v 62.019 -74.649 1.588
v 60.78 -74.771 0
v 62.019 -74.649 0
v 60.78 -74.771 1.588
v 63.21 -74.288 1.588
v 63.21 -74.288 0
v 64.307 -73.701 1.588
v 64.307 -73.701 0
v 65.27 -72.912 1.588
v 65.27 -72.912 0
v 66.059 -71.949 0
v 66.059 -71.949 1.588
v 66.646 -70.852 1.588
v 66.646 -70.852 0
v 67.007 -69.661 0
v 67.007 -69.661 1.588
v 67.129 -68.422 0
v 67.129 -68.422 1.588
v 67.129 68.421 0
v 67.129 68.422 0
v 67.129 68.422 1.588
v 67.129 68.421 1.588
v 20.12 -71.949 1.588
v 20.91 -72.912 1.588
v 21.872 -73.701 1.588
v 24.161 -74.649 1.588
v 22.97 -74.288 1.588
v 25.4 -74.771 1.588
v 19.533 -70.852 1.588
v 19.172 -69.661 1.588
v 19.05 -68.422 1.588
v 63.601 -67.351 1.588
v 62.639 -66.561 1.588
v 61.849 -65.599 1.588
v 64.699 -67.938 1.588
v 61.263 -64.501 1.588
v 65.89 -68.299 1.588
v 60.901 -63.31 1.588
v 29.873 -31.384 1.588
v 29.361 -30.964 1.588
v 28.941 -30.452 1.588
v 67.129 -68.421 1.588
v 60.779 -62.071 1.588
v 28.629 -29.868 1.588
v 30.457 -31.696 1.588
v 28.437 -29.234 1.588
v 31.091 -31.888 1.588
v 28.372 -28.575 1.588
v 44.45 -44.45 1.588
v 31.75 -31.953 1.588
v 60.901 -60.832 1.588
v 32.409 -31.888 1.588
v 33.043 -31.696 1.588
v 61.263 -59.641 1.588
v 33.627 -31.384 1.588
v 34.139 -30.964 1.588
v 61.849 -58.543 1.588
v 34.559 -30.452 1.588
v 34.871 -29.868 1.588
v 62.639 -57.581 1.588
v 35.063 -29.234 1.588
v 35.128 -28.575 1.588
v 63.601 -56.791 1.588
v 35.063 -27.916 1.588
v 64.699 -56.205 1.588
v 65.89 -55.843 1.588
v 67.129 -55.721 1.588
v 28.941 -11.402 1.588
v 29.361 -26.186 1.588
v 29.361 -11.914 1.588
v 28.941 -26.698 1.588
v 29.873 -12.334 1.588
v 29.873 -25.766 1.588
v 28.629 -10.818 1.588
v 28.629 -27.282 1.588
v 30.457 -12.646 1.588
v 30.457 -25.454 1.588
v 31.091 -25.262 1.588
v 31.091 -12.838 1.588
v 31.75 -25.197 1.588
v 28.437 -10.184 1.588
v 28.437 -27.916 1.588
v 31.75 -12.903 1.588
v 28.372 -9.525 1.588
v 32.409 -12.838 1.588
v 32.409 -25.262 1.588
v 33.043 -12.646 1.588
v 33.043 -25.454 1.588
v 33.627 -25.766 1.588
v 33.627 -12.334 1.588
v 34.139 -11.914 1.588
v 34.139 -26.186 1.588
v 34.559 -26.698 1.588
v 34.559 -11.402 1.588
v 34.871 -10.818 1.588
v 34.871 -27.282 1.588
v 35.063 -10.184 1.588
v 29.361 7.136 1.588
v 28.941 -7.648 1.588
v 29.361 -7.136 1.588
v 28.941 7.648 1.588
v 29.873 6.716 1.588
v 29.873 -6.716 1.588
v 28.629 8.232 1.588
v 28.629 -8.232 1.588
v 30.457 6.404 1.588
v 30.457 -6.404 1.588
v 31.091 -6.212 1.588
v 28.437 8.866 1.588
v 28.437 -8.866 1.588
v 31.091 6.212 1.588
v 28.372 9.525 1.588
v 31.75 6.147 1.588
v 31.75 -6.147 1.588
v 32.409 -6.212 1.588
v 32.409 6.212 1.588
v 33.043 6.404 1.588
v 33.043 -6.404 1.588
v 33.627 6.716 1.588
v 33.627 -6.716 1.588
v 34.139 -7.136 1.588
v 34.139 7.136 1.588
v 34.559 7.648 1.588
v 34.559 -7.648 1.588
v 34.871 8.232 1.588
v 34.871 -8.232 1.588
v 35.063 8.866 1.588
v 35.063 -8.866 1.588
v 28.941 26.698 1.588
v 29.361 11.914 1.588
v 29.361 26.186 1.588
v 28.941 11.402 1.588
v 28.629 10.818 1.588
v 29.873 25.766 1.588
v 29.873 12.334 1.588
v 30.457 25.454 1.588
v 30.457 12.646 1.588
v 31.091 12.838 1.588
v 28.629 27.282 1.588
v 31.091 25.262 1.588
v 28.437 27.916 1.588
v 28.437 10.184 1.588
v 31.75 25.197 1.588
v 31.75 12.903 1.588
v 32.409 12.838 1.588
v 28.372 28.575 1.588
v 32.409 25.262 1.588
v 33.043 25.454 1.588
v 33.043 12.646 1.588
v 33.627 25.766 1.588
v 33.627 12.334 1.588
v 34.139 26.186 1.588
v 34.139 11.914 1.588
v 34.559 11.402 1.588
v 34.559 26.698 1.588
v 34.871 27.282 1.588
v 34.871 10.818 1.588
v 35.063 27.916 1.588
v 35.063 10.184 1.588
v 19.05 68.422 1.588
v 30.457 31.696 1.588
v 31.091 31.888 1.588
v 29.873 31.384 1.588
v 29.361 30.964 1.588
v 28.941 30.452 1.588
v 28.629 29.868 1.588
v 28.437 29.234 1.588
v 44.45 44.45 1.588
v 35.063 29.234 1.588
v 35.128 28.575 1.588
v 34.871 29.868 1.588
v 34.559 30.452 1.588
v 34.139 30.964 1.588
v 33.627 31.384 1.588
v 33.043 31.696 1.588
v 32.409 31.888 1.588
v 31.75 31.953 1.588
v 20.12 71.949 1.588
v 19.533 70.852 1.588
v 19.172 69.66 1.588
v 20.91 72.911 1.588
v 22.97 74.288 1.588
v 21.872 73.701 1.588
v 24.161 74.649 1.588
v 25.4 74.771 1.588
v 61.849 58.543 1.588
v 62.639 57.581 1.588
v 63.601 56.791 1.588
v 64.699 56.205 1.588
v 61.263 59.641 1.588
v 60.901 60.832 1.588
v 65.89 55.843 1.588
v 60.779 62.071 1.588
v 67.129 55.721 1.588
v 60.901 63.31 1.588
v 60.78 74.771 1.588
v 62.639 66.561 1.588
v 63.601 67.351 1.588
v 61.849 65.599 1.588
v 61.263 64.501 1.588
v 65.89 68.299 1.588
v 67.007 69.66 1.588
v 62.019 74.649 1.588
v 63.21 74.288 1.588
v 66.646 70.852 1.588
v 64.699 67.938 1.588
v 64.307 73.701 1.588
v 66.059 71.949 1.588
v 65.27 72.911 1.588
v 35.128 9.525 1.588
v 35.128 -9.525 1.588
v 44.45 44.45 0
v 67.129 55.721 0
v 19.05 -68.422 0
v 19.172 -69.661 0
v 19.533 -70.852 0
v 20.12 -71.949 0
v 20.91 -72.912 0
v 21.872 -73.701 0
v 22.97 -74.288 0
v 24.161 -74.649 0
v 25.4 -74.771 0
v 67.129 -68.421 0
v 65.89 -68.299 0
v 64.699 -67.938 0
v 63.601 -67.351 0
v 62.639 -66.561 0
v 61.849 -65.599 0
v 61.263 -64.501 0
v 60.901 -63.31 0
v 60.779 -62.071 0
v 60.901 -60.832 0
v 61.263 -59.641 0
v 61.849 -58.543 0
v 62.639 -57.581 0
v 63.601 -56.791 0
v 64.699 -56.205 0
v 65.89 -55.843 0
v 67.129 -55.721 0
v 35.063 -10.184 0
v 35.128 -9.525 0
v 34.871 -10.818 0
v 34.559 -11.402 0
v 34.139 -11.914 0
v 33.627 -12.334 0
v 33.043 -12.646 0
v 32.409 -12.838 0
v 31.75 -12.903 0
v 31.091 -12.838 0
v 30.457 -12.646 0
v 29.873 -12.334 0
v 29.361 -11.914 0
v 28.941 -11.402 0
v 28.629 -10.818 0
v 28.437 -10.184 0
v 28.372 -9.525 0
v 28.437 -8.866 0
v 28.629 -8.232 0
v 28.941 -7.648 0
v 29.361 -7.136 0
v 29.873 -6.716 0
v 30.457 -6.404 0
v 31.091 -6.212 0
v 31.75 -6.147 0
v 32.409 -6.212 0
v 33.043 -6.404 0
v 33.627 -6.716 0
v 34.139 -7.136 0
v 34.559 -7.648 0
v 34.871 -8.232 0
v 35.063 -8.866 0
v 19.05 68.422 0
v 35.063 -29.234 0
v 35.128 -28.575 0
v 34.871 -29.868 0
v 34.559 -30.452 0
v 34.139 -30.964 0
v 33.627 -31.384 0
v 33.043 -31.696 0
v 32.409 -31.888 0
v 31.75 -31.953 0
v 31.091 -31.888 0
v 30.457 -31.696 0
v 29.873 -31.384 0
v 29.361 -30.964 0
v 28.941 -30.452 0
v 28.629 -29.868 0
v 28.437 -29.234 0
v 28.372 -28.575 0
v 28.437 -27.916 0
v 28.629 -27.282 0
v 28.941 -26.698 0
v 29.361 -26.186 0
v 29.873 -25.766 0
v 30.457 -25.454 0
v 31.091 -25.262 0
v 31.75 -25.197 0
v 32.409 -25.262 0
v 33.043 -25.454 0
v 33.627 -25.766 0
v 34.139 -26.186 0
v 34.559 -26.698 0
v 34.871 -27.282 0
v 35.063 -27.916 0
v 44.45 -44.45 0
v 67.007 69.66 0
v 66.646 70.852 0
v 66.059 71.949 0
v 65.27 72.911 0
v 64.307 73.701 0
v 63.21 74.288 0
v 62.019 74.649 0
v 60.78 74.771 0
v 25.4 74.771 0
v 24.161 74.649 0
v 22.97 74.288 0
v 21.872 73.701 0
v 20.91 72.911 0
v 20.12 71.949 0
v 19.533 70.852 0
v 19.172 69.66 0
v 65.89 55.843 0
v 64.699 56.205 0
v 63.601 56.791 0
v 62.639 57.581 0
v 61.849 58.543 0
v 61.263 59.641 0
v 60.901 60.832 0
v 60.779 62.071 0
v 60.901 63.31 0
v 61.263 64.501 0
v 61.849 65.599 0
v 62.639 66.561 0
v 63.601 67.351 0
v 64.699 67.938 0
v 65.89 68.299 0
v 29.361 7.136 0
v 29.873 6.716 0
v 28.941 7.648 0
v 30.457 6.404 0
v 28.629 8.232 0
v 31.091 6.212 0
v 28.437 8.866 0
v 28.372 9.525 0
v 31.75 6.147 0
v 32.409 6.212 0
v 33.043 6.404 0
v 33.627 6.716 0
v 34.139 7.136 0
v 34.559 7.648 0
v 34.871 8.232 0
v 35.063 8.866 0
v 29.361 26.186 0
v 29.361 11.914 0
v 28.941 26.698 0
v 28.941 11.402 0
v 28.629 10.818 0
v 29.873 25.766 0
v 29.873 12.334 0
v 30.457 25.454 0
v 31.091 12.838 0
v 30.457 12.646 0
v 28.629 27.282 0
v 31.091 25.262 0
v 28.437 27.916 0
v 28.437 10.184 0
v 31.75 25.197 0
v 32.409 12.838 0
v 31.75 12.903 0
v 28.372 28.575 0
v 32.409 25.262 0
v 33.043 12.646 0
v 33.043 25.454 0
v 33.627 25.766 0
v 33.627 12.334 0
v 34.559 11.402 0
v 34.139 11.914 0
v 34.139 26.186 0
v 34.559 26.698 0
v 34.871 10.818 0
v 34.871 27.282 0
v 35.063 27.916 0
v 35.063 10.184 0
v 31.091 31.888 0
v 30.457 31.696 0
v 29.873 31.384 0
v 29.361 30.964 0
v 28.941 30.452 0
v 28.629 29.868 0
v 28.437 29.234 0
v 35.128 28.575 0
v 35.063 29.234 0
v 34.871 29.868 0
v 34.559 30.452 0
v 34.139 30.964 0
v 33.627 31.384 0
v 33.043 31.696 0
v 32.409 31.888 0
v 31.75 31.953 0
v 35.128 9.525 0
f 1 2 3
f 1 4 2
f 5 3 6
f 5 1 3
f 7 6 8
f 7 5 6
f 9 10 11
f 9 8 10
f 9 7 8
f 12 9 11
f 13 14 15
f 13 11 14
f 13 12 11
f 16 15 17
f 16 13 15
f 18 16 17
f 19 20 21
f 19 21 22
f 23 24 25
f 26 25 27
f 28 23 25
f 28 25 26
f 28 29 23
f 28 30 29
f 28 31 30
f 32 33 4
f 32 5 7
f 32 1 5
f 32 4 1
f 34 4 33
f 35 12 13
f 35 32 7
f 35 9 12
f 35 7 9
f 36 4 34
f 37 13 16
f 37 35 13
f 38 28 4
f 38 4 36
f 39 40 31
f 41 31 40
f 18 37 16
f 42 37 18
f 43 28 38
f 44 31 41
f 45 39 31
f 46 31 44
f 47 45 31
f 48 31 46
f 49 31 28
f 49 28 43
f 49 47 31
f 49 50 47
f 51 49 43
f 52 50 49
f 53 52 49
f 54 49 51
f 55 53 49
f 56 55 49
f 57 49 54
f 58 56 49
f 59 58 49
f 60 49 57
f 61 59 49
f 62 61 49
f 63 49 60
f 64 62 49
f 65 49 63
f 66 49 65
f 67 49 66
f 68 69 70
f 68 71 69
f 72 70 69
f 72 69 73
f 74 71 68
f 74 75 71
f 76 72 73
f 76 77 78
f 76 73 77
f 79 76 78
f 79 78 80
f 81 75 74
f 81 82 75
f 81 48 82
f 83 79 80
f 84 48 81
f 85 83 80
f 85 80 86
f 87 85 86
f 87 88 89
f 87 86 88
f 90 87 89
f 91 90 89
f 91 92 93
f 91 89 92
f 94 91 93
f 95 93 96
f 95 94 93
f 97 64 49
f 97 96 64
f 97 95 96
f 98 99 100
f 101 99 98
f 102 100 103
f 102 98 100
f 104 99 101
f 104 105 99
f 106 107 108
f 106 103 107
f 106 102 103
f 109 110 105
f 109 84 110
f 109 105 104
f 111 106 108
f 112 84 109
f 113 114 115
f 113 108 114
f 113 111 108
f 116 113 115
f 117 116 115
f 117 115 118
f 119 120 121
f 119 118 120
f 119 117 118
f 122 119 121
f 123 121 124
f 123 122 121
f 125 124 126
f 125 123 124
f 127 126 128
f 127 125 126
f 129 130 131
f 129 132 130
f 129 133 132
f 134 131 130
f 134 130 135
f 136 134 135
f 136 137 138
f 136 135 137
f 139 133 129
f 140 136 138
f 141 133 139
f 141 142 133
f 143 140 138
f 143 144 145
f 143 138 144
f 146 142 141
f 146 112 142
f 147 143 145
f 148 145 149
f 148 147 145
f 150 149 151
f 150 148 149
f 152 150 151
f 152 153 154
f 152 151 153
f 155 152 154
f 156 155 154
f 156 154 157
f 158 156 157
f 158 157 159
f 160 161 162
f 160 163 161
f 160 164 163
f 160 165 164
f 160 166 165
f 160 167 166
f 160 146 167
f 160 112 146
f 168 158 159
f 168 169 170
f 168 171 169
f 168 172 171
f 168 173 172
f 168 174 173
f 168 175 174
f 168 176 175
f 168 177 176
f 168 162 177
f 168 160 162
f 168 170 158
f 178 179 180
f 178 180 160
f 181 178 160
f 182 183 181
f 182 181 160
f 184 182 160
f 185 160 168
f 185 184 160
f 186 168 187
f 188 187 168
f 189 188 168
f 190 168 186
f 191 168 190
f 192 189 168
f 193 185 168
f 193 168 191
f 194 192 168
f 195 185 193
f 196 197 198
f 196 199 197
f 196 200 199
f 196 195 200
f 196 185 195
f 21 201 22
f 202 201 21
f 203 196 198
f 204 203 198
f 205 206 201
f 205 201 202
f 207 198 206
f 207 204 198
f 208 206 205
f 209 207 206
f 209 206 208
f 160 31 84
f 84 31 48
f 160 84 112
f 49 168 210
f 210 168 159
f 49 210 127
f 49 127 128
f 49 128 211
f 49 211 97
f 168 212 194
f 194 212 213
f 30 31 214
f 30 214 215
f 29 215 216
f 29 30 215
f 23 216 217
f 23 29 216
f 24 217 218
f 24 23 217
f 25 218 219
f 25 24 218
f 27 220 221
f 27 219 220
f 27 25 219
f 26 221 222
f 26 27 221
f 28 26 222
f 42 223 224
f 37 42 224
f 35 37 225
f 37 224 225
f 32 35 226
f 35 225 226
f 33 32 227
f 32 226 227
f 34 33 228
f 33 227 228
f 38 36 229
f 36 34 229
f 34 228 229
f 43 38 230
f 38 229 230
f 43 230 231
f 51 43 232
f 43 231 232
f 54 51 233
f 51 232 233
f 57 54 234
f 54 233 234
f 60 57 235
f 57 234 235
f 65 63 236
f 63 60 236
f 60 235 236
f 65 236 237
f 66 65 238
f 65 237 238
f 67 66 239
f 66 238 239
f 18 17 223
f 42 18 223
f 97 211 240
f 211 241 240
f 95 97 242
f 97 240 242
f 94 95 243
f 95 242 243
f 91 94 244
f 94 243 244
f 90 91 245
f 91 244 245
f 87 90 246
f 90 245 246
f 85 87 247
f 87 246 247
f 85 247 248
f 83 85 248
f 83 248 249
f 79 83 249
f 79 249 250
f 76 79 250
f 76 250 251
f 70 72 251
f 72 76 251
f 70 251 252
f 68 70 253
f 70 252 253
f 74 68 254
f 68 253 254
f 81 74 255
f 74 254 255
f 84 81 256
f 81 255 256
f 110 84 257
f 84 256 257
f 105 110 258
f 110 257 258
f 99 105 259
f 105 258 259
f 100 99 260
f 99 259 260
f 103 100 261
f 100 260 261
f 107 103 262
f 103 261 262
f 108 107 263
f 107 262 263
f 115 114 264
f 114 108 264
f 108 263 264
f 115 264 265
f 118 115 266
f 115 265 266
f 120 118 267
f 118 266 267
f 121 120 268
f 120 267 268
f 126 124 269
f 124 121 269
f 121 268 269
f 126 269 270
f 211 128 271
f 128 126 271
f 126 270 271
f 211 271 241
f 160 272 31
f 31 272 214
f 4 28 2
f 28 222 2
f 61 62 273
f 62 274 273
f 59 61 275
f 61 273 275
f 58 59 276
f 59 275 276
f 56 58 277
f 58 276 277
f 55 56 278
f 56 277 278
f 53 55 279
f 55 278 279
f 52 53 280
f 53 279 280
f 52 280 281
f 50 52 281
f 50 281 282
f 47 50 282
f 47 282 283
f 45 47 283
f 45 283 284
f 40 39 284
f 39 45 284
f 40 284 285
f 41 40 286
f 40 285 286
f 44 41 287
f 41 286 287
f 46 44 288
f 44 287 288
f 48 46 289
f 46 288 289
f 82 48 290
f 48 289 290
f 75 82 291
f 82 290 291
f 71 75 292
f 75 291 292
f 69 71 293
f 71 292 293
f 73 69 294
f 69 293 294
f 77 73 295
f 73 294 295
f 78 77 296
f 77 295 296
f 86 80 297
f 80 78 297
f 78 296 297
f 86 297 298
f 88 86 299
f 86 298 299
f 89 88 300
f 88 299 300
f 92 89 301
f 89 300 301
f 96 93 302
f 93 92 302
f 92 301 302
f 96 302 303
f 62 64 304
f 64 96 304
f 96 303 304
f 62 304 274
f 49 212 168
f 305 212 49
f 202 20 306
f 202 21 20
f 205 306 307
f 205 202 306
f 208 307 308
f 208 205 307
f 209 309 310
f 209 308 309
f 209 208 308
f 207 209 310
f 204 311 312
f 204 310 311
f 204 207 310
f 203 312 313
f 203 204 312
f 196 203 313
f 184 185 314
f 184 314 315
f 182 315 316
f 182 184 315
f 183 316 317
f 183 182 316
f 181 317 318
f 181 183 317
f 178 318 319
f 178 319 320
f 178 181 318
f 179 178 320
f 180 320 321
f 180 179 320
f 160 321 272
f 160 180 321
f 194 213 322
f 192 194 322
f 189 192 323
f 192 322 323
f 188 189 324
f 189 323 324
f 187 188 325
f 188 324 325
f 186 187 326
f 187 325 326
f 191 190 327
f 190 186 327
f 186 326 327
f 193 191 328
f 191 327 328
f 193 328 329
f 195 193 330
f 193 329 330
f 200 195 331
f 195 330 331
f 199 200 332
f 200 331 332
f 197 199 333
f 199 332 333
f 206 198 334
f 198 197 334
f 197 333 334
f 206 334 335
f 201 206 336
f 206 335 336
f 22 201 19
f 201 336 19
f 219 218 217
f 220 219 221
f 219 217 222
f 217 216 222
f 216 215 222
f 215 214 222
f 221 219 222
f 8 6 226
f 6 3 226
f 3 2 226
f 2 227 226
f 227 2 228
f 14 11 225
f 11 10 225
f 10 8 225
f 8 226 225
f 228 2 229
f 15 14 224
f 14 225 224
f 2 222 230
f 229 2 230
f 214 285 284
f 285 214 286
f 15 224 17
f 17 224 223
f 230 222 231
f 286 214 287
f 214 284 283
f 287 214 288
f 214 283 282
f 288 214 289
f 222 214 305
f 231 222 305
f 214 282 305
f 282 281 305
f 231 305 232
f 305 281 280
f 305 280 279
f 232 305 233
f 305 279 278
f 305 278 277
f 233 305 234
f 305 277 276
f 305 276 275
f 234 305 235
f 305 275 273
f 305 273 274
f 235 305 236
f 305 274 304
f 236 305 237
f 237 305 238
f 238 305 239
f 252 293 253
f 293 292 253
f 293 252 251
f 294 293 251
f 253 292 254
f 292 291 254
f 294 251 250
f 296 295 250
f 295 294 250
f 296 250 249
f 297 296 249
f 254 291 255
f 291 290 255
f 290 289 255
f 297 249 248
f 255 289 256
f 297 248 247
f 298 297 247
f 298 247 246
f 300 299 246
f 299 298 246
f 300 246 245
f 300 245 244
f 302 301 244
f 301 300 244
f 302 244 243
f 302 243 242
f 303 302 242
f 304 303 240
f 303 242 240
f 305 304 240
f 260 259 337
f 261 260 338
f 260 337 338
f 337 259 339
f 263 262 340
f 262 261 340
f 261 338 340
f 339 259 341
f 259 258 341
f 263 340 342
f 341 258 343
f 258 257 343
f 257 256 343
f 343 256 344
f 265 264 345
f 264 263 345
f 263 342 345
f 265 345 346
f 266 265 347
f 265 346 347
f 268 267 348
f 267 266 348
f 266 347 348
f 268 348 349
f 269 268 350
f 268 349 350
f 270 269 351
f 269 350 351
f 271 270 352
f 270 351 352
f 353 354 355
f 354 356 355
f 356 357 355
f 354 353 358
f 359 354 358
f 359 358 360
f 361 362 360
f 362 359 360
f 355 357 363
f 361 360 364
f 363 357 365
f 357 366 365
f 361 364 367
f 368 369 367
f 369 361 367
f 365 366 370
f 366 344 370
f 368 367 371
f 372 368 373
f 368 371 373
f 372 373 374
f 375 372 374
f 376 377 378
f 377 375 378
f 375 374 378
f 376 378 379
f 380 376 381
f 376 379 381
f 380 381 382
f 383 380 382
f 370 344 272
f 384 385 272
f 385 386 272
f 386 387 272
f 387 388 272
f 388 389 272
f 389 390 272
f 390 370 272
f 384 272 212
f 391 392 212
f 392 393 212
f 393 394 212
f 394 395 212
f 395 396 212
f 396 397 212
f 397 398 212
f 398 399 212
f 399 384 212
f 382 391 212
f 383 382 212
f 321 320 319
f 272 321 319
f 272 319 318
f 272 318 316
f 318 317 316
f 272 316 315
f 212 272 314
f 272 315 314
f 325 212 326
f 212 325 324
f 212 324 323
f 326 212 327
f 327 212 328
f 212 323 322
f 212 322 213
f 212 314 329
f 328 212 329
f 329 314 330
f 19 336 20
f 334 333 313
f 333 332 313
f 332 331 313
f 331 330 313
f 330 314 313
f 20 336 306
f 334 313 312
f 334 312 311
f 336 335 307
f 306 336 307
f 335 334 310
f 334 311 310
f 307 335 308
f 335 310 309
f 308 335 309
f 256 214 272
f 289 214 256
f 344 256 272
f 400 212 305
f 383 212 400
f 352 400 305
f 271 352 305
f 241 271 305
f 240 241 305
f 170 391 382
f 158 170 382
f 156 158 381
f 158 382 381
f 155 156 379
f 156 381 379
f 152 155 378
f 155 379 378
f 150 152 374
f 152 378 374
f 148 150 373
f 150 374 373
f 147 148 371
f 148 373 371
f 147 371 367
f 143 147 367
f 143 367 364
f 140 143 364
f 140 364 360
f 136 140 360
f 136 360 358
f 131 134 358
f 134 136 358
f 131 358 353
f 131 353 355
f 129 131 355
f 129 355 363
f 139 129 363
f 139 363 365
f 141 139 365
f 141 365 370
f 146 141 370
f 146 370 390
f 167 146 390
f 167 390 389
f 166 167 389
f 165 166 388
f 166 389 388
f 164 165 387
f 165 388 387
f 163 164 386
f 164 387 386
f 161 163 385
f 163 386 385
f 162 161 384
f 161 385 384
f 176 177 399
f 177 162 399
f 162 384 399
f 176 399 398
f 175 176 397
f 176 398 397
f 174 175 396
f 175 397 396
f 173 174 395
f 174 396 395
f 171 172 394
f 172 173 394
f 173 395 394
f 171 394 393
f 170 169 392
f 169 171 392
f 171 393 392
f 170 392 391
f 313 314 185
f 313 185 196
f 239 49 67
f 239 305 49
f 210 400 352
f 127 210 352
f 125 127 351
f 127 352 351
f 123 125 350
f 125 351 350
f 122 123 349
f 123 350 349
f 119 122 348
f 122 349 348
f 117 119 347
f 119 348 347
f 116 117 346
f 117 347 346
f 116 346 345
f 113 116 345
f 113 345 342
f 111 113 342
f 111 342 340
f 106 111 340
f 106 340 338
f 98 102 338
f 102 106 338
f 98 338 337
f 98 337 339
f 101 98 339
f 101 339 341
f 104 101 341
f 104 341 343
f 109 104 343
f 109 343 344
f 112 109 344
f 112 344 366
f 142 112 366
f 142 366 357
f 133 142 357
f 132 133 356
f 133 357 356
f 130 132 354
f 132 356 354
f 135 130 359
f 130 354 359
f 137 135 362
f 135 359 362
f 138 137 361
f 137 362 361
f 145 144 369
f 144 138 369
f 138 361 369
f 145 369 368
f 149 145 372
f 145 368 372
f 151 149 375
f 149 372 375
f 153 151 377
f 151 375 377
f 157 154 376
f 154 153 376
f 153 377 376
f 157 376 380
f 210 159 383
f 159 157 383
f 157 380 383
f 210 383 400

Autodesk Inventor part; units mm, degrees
ref_plane "YZ Plane" through (0, 0, 0) normal (1, 0, 0) x (0, 1, 0)
ref_plane "XZ Plane" through (0, 0, 0) normal (0, 1, 0) x (-1, 0, 0)
ref_plane "XY Plane" through (0, 0, 0) normal (0, 0, 1) x (1, 0, 0)
sketch "Sketch1" plane through (0, 0, 0) normal (0, 0, 1) x (1, 0, 0)
  circle A0 centre (31.75, 28.575) radius 3.3782 projected
  circle A1 centre (31.75, 9.525) radius 3.3782 projected
  circle A2 centre (31.75, -9.525) radius 3.3782 projected
  circle A3 centre (31.75, -28.575) radius 3.3782 projected
  circle A4 centre (67.1293, 62.0712) radius 6.35 construction
  circle A5 centre (67.1293, -62.0713) radius 6.35 construction
  line L0 (19.05, 74.7712) -> (19.05, -74.7713)
  line L1 (19.05, -74.7713) -> (67.1293, -74.7713)
  line L2 (67.1293, -74.7713) -> (67.1293, -68.4213)
  line L3 (19.05, 74.7712) -> (67.1293, 74.7712)
  line L4 (67.1293, 74.7712) -> (67.1293, 68.4212)
  line L5 (67.1293, 62.0712) -> (67.1293, 55.7212) construction
  line L6 (67.1293, -55.7213) -> (67.1293, -62.0713) construction
  line L7 (44.45, 44.45) -> (44.45, -44.45)
  line L8 (44.45, -44.45) -> (67.1293, -55.7213)
  line L9 (44.45, 44.45) -> (67.1293, 55.7212)
  arc A6 (67.1293, 68.4212) -> (67.1293, 55.7212) centre (67.1293, 62.0712) ccw
  line L10 (67.1293, 68.4212) -> (67.1293, 62.0712) construction
  arc A7 (67.1293, -55.7213) -> (67.1293, -68.4213) centre (67.1293, -62.0713) ccw
  line L11 (67.1293, -62.0713) -> (67.1293, -68.4213) construction
  point P0 (0, 0)
  dimension "d0" = 88.9
  dimension "d2" = 12.7
  dimension "d3" = 12.7
  dimension "d4" = 12.7
  dimension "d5" = 12.7
extrude "Extrusion1" add sketch "Sketch1" along normal blind 1.5875
fillet "Fillet1" radius 6.35 4 edges at (67.1293, 74.7712, 0.7937) (67.1293, -74.7713, 0.7937) (19.05, -74.7713, 0.7937) (19.05, 74.7712, 0.7937)
equation "\"d4\" = d3"
equation "\"d5\" = d2"
properties part number "V5 Shooter Guide Rail Support Plate" material "Aluminum-6061"
